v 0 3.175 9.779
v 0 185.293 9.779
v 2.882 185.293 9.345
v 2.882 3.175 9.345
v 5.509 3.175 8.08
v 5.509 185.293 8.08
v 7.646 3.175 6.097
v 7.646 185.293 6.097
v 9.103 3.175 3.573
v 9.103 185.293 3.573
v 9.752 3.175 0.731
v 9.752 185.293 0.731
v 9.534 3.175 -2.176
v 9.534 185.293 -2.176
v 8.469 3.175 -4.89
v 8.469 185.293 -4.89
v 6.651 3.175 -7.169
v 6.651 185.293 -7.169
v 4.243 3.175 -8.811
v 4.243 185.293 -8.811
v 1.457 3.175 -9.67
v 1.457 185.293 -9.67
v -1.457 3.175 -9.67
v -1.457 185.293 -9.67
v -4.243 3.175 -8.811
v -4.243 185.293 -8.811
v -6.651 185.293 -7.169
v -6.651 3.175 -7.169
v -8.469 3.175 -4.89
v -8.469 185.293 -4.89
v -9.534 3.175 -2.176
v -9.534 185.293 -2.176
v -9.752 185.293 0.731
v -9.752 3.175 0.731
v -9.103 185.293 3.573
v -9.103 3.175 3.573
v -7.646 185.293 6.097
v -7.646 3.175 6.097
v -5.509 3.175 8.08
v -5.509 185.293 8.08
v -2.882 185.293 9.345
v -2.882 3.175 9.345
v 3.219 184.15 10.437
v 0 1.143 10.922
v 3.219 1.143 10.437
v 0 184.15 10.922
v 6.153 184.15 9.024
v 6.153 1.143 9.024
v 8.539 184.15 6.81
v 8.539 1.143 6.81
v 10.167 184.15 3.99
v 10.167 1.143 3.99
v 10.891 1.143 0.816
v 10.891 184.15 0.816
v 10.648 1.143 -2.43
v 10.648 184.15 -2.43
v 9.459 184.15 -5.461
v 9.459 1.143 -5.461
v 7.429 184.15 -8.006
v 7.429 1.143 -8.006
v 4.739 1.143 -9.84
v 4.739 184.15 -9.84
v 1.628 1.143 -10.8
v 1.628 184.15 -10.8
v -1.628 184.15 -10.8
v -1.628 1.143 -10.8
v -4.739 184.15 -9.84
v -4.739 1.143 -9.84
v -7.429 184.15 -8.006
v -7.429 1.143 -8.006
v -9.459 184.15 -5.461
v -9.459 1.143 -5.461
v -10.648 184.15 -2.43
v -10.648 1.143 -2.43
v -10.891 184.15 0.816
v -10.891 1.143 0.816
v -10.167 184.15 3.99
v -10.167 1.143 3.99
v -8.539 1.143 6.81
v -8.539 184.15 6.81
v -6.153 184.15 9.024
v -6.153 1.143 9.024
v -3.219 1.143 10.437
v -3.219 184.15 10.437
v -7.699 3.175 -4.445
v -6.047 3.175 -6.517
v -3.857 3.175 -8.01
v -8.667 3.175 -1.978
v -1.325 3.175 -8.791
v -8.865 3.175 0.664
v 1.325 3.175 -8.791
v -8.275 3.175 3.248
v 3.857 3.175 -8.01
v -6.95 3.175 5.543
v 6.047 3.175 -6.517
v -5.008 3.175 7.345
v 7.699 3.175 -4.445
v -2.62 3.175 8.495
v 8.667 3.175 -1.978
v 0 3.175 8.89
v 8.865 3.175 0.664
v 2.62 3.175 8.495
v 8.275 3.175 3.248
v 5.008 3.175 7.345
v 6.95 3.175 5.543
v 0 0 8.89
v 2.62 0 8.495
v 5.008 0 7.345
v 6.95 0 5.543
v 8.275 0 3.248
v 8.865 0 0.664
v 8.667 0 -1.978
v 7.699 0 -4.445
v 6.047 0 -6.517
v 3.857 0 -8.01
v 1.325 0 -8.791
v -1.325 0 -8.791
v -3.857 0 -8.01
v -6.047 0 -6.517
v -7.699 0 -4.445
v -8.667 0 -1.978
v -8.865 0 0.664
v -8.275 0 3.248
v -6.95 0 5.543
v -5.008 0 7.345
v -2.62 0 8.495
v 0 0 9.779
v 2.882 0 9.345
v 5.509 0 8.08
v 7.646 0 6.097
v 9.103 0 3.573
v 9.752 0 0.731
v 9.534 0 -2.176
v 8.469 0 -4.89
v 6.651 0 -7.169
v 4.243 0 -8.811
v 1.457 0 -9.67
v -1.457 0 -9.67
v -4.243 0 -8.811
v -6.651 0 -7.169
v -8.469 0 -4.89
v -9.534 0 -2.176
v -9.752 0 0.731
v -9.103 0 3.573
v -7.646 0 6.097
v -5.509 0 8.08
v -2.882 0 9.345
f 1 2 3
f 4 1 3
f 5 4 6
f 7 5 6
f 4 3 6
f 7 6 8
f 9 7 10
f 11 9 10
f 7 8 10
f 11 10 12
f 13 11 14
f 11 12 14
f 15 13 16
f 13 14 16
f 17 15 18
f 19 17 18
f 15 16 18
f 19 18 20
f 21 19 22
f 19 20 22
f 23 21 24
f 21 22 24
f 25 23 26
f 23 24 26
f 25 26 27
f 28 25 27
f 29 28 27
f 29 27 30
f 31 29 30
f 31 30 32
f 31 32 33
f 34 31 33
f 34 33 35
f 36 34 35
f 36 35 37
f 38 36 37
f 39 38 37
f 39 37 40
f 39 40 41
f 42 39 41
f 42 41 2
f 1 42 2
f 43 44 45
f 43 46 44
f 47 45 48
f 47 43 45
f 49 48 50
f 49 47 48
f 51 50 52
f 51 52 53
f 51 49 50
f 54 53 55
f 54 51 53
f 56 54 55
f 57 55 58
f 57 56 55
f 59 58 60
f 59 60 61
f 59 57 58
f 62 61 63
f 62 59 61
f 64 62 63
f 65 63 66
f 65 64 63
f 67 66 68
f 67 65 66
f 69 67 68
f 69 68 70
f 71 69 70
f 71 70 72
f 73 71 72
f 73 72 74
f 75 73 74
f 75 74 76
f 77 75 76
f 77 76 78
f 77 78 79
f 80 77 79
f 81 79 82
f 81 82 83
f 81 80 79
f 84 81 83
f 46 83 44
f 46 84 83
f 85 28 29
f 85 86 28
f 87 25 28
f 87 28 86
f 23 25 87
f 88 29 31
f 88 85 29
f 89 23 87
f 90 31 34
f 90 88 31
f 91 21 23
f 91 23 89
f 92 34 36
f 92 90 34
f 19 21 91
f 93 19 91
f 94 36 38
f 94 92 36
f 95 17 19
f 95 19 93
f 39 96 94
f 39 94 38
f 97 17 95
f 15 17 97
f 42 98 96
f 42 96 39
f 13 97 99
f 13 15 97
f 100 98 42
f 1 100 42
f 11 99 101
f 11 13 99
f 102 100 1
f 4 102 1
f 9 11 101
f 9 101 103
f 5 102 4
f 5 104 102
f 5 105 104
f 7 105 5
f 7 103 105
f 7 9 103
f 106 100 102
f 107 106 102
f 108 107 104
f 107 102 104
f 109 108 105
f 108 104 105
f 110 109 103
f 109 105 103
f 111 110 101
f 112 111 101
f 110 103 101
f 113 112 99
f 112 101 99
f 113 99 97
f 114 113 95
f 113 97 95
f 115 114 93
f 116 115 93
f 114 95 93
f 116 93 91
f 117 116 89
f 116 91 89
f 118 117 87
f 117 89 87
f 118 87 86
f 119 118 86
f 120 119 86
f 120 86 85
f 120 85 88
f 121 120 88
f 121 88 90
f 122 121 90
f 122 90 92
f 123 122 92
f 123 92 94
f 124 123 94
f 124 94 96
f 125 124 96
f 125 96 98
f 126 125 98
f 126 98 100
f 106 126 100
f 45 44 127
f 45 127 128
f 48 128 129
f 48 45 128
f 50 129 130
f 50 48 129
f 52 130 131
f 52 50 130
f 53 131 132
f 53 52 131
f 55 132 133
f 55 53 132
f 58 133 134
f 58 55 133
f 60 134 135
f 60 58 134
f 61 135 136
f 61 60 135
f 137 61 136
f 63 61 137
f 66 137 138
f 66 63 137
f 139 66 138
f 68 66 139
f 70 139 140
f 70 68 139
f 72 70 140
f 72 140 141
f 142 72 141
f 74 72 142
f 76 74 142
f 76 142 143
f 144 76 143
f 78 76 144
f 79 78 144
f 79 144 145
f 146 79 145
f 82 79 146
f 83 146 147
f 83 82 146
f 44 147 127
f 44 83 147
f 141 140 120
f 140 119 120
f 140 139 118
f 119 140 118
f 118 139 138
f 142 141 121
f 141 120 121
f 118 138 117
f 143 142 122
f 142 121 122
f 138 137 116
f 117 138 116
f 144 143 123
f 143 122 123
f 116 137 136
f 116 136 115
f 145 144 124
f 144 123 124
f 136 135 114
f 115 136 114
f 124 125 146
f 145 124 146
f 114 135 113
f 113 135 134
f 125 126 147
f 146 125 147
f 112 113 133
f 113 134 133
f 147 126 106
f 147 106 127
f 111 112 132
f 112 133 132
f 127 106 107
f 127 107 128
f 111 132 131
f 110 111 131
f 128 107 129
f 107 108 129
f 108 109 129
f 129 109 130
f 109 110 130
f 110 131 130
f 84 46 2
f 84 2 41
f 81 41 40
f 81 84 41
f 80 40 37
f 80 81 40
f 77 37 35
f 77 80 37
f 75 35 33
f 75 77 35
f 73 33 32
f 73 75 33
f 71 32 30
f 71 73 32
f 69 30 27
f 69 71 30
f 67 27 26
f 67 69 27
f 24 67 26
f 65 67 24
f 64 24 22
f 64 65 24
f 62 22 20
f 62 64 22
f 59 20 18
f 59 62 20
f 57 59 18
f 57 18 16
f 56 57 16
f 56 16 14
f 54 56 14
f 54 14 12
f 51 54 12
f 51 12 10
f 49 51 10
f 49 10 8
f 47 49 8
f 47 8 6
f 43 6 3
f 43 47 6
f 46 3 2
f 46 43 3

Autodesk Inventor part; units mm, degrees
ref_plane "YZ Plane" through (0, 0, 0) normal (1, 0, 0) x (0, 1, 0)
ref_plane "XZ Plane" through (0, 0, 0) normal (0, 1, 0) x (-1, 0, 0)
ref_plane "XY Plane" through (0, 0, 0) normal (0, 0, 1) x (1, 0, 0)
sketch "Sketch1" plane through (0, 0, 0) normal (1, 0, 0) x (0, 1, 0)
  line L0 (0, 0) -> (185.293, 0)
  line L1 (0, 10.922) -> (185.293, 10.922)
  line L2 (0, 10.922) -> (0, 9.779) construction
  line L3 (0, 9.779) -> (185.293, 9.779)
  line L4 (185.293, 9.779) -> (185.293, 10.922) construction
  line L5 (0, 9.779) -> (0, 0) construction
  line L6 (185.293, 9.779) -> (185.293, 0) construction
  line L7 (0, 9.779) -> (1.143, 10.922)
  line L8 (185.293, 9.779) -> (184.15, 10.922)
  line L9 (0, 9.779) -> (0, 8.89)
  line L10 (0, 8.89) -> (3.175, 8.89)
  line L11 (3.175, 8.89) -> (3.175, 9.779)
  dimension "d0" = 185.293
  dimension "d2" = 19.558
  dimension "d3" = 45
  dimension "d5" = 21.844
  dimension "d6" = 3.175
  dimension "d7" = 17.78
revolve "Revolution1" add sketch "Sketch1" angle 360 about axis through (0, 0, 0) along (0, 1, 0)
properties part number "Rebuild Shooter NCDME075-0600 Body" material "Stainless Steel"
